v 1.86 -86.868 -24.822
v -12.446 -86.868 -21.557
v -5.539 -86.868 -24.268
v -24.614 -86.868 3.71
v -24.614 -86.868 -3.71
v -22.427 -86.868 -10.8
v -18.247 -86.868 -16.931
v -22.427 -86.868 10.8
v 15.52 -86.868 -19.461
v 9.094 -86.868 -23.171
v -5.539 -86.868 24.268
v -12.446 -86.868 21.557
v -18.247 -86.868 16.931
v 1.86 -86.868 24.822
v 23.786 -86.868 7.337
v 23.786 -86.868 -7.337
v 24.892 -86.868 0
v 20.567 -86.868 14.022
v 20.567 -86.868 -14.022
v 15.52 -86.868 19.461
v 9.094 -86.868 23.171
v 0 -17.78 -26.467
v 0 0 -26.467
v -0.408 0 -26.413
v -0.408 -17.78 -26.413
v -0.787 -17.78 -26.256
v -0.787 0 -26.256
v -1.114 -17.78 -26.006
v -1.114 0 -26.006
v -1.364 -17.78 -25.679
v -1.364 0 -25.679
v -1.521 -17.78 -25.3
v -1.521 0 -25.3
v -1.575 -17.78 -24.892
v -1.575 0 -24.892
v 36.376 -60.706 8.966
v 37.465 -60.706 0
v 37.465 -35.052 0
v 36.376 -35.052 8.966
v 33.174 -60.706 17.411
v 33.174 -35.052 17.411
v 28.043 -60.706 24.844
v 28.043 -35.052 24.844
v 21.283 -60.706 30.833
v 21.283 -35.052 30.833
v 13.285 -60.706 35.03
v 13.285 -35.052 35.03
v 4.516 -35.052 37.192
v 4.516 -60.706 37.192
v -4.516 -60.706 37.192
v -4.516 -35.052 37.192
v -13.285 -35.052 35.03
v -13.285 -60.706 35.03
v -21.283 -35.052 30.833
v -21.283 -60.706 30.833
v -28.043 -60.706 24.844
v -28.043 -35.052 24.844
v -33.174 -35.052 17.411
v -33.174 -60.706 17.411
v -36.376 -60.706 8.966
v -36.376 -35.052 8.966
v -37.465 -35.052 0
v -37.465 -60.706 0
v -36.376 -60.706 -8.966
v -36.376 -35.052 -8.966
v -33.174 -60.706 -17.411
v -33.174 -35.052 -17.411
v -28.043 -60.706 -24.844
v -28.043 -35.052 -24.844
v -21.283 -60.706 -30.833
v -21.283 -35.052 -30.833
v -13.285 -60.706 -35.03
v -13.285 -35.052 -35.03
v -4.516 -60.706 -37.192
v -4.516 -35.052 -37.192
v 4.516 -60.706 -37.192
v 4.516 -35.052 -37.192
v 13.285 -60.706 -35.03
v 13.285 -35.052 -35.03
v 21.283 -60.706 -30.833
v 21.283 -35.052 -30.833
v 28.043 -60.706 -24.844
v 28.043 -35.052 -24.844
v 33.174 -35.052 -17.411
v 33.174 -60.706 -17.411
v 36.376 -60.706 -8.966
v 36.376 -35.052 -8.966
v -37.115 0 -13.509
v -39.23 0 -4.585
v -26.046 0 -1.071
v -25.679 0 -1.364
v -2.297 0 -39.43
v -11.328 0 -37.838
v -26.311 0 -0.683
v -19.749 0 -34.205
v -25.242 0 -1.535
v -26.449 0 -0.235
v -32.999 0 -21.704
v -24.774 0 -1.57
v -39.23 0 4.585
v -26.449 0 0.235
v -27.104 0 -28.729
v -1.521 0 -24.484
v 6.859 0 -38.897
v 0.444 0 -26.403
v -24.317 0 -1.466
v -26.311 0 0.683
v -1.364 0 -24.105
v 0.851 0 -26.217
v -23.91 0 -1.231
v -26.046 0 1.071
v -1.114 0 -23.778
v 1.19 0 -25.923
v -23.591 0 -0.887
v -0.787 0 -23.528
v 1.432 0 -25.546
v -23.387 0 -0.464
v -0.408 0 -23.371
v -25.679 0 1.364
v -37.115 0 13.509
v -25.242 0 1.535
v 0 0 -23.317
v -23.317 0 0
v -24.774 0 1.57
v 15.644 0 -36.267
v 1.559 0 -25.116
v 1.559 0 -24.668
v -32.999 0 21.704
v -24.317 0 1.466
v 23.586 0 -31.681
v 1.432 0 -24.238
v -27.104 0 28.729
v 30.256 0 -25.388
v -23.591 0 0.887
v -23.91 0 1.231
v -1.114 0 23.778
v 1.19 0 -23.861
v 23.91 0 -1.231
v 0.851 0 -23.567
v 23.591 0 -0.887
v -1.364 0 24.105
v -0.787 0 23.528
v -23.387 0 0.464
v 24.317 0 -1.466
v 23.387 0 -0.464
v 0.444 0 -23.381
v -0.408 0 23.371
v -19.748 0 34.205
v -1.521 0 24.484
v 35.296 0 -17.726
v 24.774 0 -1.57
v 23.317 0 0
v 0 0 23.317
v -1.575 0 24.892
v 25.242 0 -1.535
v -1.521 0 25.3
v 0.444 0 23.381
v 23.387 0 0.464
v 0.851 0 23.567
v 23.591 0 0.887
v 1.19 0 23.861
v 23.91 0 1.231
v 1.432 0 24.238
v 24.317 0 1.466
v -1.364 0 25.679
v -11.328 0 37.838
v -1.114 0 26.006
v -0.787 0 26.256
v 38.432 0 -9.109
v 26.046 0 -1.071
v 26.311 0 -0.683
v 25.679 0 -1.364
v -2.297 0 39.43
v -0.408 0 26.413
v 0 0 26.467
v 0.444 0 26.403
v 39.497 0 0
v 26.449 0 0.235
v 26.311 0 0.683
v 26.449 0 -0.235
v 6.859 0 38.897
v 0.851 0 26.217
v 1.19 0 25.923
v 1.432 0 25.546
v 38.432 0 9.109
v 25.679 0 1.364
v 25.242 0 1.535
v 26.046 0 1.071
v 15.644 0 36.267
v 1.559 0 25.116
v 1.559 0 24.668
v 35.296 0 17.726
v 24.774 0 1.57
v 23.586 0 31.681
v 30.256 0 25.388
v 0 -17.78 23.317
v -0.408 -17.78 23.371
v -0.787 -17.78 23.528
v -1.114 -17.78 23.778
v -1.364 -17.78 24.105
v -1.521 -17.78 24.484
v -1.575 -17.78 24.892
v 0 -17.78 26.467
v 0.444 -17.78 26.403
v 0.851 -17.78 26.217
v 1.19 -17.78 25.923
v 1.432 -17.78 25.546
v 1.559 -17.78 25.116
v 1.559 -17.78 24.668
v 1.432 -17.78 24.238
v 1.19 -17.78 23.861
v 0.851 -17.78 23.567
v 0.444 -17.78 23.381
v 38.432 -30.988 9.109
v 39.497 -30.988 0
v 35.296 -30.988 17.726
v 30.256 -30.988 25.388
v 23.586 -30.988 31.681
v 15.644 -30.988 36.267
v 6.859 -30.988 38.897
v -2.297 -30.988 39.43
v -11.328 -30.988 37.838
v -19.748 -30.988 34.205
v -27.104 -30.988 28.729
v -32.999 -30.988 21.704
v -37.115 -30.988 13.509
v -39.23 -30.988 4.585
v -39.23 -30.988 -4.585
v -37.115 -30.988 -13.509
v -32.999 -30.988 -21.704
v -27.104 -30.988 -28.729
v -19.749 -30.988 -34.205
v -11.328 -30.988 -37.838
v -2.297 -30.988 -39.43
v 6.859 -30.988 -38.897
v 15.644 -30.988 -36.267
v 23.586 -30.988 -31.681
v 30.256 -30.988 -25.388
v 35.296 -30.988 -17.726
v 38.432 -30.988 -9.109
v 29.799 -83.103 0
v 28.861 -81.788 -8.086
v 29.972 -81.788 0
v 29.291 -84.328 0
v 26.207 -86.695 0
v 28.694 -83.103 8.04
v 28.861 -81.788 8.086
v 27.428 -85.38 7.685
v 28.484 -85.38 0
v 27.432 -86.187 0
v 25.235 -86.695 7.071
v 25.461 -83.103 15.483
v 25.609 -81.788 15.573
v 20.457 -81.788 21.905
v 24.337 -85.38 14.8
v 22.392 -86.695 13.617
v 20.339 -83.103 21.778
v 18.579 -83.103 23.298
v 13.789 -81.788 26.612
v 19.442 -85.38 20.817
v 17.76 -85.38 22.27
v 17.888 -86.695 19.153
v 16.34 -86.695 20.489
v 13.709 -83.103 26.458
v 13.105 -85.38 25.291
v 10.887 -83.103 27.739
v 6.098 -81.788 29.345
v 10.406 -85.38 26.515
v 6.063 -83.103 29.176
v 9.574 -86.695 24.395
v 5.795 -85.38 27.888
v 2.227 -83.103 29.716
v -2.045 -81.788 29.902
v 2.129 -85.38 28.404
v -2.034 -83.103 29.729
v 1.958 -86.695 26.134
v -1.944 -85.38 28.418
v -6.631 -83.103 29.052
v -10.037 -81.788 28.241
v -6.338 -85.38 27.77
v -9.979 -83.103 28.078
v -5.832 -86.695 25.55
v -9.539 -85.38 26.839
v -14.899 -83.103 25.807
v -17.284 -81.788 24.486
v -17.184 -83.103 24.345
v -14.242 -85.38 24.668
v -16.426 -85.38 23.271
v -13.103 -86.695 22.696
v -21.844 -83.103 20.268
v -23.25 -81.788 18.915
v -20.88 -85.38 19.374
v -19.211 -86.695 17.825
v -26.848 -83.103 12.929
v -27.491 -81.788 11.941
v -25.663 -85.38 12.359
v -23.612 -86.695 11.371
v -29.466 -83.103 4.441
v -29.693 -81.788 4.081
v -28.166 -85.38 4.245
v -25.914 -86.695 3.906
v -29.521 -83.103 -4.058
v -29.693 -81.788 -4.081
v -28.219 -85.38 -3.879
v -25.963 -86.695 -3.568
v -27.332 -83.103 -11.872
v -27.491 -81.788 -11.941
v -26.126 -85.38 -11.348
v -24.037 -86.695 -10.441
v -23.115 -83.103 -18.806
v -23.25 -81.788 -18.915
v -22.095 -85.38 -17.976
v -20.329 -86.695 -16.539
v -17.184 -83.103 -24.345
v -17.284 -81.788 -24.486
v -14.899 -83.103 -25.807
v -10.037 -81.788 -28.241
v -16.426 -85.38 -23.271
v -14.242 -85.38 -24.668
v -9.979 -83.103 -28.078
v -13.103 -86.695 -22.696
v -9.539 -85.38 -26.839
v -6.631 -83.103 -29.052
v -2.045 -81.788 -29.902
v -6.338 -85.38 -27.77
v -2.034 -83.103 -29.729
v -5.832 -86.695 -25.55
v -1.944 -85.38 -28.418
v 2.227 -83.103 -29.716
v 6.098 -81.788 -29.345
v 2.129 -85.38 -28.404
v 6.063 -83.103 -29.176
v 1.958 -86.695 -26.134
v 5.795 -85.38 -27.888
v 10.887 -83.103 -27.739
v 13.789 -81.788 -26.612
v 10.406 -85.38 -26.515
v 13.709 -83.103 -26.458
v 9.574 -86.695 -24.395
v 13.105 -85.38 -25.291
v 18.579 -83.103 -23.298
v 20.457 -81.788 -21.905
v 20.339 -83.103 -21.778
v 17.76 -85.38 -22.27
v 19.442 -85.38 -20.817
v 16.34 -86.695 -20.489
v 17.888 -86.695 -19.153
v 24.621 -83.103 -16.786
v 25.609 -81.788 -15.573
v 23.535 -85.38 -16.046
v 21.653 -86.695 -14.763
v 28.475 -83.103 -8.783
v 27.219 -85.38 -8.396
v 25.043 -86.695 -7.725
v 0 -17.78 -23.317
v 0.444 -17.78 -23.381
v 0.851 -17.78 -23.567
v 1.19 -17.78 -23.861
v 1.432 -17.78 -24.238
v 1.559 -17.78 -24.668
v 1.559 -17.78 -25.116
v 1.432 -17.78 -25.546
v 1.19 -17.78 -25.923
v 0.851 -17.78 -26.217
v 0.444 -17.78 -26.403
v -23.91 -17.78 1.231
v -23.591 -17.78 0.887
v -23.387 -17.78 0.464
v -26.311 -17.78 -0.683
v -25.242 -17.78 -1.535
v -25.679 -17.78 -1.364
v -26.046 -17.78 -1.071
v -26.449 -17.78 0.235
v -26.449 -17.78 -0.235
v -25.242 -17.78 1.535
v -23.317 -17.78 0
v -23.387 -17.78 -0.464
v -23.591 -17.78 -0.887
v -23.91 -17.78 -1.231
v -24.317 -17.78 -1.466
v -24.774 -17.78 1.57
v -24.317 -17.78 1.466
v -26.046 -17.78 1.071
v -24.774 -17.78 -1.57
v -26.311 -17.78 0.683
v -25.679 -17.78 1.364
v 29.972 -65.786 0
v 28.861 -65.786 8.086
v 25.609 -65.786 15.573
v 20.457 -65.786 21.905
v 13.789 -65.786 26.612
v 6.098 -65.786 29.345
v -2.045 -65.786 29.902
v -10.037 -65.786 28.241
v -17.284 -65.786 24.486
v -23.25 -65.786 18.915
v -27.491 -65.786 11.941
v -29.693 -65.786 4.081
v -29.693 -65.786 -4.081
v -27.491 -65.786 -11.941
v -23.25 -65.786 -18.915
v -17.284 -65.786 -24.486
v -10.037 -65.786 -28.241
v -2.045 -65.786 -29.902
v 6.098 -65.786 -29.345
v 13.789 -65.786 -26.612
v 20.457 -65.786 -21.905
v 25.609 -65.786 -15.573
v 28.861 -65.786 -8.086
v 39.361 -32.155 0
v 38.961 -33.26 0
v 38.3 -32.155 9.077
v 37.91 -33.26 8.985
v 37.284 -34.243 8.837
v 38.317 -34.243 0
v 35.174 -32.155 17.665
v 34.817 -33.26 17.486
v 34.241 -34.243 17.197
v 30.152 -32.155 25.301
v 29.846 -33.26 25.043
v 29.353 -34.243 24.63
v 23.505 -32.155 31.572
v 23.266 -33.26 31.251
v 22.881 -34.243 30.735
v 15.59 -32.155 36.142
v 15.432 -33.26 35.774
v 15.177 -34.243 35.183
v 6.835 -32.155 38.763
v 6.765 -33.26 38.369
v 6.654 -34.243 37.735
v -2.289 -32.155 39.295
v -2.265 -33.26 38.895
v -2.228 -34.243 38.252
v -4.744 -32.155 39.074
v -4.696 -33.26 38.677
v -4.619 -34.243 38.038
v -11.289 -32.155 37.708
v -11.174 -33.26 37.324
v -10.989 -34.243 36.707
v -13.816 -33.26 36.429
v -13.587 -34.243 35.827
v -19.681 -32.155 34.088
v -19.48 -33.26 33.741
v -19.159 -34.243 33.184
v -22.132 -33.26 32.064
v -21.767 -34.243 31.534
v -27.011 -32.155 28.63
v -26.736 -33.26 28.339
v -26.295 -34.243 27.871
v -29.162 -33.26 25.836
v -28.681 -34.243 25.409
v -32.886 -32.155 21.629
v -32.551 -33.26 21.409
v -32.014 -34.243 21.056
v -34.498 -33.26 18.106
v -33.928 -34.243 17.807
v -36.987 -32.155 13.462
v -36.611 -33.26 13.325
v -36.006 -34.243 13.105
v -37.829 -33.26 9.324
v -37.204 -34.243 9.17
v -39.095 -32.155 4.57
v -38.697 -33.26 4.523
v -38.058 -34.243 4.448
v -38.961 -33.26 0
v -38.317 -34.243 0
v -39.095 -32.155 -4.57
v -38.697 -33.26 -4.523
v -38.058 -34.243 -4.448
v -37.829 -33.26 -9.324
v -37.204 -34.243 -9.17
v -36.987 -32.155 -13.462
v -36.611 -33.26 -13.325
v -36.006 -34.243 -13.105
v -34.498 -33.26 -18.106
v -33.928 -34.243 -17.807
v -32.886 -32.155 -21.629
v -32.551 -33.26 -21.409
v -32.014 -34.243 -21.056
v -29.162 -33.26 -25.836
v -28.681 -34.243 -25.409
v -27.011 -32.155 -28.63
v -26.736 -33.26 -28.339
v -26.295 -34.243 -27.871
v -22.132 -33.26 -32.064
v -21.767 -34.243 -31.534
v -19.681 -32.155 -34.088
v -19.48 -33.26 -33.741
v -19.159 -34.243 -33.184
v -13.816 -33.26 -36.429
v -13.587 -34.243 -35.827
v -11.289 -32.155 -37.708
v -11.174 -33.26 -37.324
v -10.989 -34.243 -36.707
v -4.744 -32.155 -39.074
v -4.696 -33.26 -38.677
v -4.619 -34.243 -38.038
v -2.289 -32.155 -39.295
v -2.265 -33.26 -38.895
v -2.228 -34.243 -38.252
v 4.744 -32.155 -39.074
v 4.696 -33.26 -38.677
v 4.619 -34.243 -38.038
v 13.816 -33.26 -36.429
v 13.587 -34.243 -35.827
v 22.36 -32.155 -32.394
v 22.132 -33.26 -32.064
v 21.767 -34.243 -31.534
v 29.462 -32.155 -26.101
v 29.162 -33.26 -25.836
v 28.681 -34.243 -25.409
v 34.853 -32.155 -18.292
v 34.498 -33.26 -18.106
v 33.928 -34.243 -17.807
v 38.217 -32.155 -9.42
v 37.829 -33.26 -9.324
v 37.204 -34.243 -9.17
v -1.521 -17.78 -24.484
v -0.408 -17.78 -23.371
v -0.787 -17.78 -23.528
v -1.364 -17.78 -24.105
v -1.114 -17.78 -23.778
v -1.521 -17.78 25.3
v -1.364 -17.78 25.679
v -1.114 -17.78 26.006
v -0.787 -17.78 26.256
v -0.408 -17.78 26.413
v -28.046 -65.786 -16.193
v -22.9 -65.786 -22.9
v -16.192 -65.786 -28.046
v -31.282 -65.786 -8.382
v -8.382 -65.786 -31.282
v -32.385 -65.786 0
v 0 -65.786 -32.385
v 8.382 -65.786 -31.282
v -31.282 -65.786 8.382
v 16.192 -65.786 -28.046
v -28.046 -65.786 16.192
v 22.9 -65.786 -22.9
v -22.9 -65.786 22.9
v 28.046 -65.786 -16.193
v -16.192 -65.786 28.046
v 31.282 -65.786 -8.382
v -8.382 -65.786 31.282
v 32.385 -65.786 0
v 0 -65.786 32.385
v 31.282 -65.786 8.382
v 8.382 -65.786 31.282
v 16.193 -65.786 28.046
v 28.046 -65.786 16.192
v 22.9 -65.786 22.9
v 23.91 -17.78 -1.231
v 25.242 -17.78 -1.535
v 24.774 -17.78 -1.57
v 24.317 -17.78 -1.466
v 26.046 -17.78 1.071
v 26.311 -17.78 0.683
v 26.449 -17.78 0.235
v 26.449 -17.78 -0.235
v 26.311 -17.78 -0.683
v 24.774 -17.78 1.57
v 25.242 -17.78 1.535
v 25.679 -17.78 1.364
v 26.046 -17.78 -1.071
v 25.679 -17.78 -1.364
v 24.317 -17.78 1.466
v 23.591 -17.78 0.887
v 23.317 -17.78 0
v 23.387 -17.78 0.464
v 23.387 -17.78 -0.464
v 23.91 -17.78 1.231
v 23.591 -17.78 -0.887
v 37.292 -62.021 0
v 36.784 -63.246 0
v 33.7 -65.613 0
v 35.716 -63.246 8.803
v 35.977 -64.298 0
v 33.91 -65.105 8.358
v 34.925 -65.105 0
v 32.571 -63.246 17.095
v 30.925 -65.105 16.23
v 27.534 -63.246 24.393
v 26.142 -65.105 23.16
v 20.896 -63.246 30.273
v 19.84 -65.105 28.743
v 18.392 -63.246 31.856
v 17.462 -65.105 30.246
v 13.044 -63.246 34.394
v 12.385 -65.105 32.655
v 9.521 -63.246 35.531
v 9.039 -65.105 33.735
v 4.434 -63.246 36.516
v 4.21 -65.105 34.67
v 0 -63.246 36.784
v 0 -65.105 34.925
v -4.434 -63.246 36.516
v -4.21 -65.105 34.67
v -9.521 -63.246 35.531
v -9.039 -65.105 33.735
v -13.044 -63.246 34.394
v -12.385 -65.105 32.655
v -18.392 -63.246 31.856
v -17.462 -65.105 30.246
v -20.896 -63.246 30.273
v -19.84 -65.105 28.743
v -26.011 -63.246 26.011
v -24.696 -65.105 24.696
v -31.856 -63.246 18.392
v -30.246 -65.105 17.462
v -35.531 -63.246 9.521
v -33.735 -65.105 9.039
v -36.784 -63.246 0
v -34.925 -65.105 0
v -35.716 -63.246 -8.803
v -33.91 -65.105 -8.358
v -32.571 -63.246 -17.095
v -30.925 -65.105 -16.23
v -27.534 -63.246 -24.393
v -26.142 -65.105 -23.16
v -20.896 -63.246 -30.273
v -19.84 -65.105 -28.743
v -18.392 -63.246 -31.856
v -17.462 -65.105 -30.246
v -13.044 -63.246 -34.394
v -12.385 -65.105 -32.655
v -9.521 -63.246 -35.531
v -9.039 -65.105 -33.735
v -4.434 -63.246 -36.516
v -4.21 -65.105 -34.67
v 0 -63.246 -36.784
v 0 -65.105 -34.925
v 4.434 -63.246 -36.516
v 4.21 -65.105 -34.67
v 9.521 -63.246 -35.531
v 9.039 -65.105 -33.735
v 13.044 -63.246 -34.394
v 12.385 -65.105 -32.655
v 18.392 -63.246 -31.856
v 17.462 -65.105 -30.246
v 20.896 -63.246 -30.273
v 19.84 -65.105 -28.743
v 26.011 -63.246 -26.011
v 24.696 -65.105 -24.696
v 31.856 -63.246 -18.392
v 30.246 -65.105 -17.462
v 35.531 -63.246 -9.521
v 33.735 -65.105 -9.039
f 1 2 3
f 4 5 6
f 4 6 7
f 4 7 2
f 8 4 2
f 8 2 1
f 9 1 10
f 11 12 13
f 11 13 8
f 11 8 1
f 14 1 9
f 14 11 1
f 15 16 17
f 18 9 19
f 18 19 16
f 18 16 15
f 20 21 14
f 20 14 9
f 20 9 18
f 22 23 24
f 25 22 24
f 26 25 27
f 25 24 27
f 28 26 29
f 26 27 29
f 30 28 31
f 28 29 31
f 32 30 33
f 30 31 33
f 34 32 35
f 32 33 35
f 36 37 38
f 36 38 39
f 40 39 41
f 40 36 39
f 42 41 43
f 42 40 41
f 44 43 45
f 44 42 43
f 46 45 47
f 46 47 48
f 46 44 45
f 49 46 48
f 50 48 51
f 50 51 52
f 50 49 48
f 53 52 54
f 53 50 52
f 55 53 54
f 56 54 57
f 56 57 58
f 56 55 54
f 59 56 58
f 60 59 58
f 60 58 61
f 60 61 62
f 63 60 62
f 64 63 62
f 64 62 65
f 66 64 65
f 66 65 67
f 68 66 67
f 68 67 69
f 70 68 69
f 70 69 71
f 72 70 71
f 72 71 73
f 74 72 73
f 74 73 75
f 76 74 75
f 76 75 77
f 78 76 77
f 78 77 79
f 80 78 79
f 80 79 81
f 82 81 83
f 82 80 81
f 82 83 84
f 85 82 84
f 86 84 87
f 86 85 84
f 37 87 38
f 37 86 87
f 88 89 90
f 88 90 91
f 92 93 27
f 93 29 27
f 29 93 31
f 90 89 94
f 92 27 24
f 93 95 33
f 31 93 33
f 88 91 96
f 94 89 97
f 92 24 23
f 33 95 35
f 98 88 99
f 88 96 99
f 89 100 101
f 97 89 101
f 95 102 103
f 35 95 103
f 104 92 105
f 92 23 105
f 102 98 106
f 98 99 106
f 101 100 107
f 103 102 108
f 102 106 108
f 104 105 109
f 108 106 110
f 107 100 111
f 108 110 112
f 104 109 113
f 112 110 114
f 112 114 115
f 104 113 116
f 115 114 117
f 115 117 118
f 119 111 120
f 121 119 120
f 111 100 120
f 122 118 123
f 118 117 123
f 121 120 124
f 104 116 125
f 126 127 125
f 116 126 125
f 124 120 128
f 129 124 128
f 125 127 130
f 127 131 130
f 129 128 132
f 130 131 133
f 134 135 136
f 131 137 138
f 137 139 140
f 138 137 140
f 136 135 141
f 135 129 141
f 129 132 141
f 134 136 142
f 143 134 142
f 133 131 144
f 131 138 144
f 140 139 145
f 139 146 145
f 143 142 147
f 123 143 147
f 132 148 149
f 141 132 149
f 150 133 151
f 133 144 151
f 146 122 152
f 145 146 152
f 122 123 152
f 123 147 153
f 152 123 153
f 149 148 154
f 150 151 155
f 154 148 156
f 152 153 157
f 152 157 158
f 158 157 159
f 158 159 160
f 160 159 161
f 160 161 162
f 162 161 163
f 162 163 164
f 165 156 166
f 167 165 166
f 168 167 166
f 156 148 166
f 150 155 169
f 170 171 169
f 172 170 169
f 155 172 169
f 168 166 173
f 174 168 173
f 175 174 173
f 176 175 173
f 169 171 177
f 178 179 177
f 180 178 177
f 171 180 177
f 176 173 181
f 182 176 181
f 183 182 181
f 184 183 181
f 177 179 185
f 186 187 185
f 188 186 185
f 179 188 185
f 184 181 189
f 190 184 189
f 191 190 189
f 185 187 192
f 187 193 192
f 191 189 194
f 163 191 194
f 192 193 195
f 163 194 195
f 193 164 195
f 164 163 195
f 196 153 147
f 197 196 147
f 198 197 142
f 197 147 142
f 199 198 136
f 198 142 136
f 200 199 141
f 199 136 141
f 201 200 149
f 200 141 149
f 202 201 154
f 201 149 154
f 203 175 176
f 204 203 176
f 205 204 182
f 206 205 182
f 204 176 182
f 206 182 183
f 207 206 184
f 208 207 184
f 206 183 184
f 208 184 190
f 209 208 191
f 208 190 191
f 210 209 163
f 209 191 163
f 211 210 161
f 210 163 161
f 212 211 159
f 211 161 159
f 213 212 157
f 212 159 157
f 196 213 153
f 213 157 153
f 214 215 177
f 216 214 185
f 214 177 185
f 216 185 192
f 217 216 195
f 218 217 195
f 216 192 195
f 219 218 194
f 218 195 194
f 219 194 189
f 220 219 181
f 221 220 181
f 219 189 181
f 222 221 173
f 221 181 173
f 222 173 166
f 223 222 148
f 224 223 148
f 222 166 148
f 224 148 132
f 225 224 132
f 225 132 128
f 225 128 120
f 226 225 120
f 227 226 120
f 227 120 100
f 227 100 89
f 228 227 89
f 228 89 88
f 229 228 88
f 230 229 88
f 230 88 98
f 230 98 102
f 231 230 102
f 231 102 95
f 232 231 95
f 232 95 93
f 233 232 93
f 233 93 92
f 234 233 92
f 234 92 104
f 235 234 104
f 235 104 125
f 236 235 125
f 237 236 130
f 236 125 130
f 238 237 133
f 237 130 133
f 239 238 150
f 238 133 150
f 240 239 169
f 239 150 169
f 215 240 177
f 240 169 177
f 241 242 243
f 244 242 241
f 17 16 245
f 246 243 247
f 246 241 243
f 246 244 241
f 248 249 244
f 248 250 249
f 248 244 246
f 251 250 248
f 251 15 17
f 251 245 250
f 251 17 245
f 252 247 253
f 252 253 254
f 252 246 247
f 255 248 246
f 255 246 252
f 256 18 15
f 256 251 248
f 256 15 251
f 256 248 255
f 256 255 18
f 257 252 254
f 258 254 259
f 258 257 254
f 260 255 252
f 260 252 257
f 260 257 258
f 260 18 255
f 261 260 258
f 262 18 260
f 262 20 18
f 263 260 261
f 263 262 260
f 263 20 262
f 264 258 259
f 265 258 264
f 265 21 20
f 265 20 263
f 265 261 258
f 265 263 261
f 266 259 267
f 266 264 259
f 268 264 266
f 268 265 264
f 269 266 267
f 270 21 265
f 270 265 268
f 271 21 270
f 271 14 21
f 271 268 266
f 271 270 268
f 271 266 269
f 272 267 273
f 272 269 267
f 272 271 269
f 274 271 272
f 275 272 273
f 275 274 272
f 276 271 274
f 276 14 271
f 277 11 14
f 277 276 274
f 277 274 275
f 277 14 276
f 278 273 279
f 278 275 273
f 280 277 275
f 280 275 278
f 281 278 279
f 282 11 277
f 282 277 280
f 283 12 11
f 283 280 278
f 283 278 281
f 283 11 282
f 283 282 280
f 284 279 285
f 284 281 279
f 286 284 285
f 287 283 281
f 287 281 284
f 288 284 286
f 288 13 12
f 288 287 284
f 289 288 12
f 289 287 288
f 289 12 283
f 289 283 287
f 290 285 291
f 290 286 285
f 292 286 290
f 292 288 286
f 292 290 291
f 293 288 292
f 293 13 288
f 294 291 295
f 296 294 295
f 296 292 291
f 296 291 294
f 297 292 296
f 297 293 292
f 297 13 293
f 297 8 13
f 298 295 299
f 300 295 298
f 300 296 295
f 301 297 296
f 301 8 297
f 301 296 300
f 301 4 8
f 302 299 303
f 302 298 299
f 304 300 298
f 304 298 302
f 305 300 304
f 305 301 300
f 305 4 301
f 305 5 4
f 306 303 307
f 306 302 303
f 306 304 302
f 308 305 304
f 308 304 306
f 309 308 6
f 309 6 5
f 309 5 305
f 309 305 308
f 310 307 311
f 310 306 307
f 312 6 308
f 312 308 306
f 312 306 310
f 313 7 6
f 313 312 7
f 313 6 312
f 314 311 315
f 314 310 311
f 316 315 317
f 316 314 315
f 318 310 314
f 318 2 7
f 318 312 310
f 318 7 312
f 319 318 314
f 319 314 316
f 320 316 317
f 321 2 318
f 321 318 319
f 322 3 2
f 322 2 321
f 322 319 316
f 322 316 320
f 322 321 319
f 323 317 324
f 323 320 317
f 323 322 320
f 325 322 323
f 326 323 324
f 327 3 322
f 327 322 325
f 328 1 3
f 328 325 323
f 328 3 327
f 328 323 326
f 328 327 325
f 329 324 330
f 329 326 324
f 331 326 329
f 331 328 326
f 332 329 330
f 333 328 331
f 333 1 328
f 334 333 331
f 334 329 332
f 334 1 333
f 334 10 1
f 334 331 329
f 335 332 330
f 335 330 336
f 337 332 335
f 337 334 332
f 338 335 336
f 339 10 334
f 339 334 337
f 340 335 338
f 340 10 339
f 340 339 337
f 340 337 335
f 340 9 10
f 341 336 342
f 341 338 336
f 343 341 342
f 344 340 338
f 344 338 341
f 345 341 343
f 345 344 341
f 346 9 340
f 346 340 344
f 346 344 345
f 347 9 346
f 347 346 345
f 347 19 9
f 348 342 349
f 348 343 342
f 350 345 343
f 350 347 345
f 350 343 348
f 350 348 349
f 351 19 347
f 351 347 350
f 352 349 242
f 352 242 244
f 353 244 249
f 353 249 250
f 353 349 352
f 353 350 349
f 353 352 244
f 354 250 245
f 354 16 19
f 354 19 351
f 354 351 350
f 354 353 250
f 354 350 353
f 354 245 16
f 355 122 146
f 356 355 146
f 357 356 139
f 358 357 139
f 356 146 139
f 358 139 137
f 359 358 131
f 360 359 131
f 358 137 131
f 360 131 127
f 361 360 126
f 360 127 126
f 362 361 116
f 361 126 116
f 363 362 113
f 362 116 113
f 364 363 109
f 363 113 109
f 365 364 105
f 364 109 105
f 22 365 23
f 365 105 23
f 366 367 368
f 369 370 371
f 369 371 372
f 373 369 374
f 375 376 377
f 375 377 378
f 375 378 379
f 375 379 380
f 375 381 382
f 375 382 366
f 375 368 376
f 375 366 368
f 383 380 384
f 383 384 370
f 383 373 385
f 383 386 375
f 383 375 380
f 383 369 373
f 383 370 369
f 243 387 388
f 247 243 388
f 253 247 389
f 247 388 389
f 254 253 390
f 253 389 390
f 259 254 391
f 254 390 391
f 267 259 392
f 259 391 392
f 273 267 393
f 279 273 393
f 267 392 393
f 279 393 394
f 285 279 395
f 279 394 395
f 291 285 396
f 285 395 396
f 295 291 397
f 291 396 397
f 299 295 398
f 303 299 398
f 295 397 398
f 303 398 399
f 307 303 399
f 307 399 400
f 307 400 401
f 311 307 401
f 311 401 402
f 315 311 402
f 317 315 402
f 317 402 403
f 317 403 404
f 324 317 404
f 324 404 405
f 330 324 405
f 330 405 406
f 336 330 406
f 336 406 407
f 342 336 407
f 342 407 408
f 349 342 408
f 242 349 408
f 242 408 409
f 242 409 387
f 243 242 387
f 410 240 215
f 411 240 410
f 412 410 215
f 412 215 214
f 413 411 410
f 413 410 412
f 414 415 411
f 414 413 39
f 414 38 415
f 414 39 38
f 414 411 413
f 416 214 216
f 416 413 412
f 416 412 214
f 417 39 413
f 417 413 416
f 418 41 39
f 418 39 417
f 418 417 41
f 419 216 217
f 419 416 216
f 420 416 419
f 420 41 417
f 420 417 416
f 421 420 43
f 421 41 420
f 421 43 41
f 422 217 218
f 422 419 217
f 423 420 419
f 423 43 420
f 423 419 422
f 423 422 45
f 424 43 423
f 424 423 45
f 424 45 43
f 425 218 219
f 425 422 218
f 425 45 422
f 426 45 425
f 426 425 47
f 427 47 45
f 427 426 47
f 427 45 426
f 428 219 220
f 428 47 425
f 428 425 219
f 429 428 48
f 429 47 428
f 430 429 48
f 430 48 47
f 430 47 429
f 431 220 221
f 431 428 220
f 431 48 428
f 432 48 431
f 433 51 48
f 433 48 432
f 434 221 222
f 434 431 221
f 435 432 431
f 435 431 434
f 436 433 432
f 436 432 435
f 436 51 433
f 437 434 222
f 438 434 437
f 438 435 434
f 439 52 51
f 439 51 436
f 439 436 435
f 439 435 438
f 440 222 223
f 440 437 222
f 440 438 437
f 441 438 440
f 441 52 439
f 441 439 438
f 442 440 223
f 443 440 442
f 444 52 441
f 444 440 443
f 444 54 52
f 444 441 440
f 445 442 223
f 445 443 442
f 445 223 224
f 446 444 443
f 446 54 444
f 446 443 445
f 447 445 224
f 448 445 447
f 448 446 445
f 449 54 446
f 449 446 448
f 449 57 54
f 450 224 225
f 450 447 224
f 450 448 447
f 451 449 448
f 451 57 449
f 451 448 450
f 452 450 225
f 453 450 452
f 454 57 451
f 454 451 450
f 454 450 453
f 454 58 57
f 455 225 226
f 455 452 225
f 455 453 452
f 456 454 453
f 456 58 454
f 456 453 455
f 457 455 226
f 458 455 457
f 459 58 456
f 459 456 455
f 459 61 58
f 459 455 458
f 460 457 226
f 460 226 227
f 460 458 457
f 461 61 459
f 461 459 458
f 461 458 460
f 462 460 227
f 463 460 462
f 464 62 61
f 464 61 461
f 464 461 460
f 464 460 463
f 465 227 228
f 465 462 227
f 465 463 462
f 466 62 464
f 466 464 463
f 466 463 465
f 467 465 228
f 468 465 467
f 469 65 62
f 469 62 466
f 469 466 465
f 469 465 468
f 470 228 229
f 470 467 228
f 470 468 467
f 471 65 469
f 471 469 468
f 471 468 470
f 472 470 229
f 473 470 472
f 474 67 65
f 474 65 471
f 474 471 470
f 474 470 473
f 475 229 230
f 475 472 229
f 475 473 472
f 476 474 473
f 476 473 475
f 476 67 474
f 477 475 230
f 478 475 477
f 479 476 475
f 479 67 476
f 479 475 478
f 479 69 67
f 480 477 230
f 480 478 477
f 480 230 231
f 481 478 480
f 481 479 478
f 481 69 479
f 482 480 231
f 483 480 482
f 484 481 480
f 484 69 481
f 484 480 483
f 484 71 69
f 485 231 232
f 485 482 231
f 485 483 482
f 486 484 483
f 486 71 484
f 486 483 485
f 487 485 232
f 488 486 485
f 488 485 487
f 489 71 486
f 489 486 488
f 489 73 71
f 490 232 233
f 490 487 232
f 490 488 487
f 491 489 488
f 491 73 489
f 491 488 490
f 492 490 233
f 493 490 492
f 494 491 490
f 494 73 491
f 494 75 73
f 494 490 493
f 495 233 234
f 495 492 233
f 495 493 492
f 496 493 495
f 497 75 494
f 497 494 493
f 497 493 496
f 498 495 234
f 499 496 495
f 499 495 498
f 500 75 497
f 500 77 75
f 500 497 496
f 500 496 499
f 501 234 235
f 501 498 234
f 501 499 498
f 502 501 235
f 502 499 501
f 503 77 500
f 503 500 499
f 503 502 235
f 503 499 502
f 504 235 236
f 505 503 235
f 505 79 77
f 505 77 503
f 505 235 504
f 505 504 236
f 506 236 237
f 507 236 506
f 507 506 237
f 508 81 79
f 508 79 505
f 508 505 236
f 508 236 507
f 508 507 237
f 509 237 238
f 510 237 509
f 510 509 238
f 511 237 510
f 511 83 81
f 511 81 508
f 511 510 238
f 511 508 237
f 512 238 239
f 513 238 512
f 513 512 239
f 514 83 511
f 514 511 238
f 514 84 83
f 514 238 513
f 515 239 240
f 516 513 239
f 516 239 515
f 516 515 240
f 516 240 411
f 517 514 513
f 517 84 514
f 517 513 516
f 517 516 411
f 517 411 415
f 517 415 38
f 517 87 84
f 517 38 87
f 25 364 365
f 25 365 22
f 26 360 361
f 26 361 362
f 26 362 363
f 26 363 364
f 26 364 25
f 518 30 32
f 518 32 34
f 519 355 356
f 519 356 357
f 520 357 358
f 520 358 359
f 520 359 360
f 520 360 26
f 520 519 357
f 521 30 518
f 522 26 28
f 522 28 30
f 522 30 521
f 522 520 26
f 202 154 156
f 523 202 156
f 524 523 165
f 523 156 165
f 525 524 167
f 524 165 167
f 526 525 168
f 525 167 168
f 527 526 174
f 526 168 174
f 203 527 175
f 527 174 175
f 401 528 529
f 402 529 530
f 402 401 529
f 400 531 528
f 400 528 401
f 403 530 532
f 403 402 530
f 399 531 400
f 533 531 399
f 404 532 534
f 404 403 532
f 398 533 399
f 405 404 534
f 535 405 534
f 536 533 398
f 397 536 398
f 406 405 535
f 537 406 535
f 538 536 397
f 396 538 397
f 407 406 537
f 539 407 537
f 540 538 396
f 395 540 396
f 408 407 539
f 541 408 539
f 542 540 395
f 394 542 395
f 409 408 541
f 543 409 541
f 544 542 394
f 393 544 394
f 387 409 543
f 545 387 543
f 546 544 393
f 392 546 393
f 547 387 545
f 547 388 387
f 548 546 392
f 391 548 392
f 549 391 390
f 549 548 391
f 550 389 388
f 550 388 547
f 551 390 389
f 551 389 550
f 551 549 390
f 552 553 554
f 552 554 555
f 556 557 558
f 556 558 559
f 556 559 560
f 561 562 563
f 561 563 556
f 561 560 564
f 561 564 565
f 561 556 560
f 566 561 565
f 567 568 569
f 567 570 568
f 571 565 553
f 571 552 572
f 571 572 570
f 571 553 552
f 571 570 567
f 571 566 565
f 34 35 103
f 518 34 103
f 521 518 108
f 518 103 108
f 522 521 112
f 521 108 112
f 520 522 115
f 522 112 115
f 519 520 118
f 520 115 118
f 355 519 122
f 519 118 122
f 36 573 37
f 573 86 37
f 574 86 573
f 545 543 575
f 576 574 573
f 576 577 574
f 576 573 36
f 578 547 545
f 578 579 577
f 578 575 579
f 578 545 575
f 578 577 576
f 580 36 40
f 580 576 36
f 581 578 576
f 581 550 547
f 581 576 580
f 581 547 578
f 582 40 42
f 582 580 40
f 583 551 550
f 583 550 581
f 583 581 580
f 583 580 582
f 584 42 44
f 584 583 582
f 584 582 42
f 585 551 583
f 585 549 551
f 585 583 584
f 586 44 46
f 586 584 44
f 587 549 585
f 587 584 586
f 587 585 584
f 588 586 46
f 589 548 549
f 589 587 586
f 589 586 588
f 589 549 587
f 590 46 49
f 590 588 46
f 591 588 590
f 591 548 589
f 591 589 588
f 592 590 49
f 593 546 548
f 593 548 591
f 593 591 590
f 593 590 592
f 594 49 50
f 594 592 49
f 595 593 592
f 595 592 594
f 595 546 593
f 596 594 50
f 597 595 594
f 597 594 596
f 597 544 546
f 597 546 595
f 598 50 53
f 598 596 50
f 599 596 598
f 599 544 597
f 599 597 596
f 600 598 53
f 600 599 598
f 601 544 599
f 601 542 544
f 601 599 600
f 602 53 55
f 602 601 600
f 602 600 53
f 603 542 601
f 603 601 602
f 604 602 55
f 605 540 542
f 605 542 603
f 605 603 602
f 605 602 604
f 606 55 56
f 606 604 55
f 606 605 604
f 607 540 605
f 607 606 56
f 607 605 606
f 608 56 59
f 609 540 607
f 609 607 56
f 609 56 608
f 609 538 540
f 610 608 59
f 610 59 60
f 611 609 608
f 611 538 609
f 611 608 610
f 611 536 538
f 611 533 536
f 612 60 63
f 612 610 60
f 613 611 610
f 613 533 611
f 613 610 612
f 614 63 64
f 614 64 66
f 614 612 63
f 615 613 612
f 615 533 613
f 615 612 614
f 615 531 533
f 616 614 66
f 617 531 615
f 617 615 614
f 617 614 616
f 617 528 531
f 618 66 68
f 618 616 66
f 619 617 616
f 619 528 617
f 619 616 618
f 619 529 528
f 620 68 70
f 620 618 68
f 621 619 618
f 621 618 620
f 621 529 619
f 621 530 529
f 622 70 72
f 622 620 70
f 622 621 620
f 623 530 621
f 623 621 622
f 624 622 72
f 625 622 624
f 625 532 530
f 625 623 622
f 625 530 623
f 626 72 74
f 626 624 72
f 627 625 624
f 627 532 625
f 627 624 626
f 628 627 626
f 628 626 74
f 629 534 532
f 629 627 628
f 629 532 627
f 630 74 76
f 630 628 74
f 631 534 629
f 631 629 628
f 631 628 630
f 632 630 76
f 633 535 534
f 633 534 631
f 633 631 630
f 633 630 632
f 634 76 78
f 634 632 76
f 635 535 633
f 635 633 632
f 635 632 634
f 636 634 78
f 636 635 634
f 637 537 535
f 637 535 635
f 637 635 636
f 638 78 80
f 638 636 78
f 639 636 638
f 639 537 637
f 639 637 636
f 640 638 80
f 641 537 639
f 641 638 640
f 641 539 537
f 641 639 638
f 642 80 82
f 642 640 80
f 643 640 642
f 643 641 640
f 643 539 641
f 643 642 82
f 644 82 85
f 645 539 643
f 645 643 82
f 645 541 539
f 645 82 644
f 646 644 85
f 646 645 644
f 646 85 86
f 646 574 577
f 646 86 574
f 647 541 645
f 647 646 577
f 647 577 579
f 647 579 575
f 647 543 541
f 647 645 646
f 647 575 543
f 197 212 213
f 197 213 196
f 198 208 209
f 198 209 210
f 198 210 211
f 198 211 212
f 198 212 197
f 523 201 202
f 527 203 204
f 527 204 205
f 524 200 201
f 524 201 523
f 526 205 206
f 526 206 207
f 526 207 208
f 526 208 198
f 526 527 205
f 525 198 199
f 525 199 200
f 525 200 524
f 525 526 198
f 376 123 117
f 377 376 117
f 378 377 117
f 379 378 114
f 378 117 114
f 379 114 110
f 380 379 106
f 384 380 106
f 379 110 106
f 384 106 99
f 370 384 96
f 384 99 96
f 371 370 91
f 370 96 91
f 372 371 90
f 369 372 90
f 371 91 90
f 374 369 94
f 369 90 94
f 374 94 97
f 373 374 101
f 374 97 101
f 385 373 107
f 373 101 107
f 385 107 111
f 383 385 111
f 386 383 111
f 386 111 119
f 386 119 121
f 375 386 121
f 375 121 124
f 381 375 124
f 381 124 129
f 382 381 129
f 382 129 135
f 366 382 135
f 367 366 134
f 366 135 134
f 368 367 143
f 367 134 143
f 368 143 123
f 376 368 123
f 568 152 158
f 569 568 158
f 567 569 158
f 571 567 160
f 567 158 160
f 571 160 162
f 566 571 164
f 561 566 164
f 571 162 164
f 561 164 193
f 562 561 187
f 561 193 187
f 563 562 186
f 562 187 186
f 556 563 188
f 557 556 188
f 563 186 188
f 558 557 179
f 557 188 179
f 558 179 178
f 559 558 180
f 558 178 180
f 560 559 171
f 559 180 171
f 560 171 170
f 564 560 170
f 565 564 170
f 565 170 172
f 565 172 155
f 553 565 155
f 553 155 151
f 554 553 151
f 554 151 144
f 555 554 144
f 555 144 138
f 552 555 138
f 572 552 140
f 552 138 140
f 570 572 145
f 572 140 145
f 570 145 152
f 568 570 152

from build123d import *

# Parameters (mm, degrees)
F0_R     = 39.497
F1_DEPTH = 91.186
F2_R     = 39.497
F2_R_2   = 37.465
F3_DEPTH = 56.134
F4_R     = 37.465
F4_R_2   = 32.893
F5_DEPTH = 25.4
F6_R     = 29.972
F7_DEPTH = 21.082
F9_DEPTH = 17.78


# Not quite as in the source:
# - a fillet or chamfer that OpenCascade refuses, or shapes differently, is made with other operations: its cross-section is extruded or revolved along the edge and cut away or added


with BuildPart() as f1:
    # F0 (on Front) → F1 (new body)
    with BuildSketch(Plane.XZ):
        Circle(F0_R)
    extrude(amount=F1_DEPTH)

    # F2 (on face) → F3 (cut)
    with BuildSketch(Plane.XZ.offset(91.186)):
        Circle(F2_R)
        Circle(F2_R_2, mode=Mode.SUBTRACT)
    extrude(amount=-F3_DEPTH, mode=Mode.SUBTRACT)

    # F4 (on face) → F5 (cut)
    with BuildSketch(Plane.XZ.offset(91.186)):
        Circle(F4_R)
        Circle(F4_R_2, mode=Mode.SUBTRACT)
        Circle(F4_R_2)
    extrude(amount=-F5_DEPTH, mode=Mode.SUBTRACT)

    # F6 (on face) → F7 (join)
    with BuildSketch(Plane.XZ.offset(65.786)):
        Circle(F6_R)
    extrude(amount=F7_DEPTH)

    # F8 (on face) → F9 (cut)
    with BuildSketch(Plane(origin=(0, 0, 0), x_dir=(-1, 0, 0), z_dir=(0, 1, 0))):
        with BuildLine():
            ThreePointArc((0, 23.3172), (1.113551759, 23.778448241), (1.5748, 24.892))
            ThreePointArc((1.5748, 24.892), (1.113551759, 26.005551759), (0, 26.4668))
            ThreePointArc((0, 26.4668), (-1.5748, 24.892), (0, 23.3172))
        make_face()
        with BuildLine():
            ThreePointArc((26.4668, 0), (24.892, 1.5748), (23.3172, 0))
            ThreePointArc((23.3172, 0), (24.892, -1.5748), (26.4668, 0))
        make_face()
        with BuildLine():
            ThreePointArc((1.5748, -24.892), (1.113551759, -23.778448241), (0, -23.3172))
            ThreePointArc((0, -23.3172), (-1.5748, -24.892), (0, -26.4668))
            ThreePointArc((0, -26.4668), (1.113551759, -26.005551759), (1.5748, -24.892))
        make_face()
        with BuildLine():
            ThreePointArc((-26.4668, 0), (-24.892, -1.5748), (-23.3172, 0))
            ThreePointArc((-23.3172, 0), (-24.892, 1.5748), (-26.4668, 0))
        make_face()
    extrude(amount=-F9_DEPTH, mode=Mode.SUBTRACT)

    # F10: fillet of radius 5.08 on 3 edges, made by hand

    # F10_s1 → F10_t2 (revolve, cut)
    with BuildSketch(Plane.XY):
        with BuildLine():
            ThreePointArc((37.465, -60.706), (35.9771024484, -64.2981024484), (32.385, -65.786))
            Line((32.385, -65.786), (37.465, -65.786))
            Line((37.465, -65.786), (37.465, -60.706))
        make_face()
    revolve(axis=Axis((0, -65.786, 0), (0, -1, 0)), mode=Mode.SUBTRACT)

    # F10_s3 → F10_t4 (revolve, cut)
    with BuildSketch(Plane.XY):
        with BuildLine():
            ThreePointArc((39.497, -30.988), (38.9606901303, -33.2598450651), (37.465, -35.052))
            Line((37.465, -35.052), (39.497, -35.052))
            Line((39.497, -35.052), (39.497, -30.988))
        make_face()
    revolve(axis=Axis((0, -35.052, 0), (0, -1, 0)), mode=Mode.SUBTRACT)

    # F10_s5 → F10_t6 (revolve, cut)
    with BuildSketch(Plane.XY):
        with BuildLine():
            ThreePointArc((29.972, -81.788), (28.4841024484, -85.3801024484), (24.892, -86.868))
            Line((24.892, -86.868), (29.972, -86.868))
            Line((29.972, -86.868), (29.972, -81.788))
        make_face()
    revolve(axis=Axis((0, -86.868, 0), (0, -1, 0)), mode=Mode.SUBTRACT)


solid = f1.part
